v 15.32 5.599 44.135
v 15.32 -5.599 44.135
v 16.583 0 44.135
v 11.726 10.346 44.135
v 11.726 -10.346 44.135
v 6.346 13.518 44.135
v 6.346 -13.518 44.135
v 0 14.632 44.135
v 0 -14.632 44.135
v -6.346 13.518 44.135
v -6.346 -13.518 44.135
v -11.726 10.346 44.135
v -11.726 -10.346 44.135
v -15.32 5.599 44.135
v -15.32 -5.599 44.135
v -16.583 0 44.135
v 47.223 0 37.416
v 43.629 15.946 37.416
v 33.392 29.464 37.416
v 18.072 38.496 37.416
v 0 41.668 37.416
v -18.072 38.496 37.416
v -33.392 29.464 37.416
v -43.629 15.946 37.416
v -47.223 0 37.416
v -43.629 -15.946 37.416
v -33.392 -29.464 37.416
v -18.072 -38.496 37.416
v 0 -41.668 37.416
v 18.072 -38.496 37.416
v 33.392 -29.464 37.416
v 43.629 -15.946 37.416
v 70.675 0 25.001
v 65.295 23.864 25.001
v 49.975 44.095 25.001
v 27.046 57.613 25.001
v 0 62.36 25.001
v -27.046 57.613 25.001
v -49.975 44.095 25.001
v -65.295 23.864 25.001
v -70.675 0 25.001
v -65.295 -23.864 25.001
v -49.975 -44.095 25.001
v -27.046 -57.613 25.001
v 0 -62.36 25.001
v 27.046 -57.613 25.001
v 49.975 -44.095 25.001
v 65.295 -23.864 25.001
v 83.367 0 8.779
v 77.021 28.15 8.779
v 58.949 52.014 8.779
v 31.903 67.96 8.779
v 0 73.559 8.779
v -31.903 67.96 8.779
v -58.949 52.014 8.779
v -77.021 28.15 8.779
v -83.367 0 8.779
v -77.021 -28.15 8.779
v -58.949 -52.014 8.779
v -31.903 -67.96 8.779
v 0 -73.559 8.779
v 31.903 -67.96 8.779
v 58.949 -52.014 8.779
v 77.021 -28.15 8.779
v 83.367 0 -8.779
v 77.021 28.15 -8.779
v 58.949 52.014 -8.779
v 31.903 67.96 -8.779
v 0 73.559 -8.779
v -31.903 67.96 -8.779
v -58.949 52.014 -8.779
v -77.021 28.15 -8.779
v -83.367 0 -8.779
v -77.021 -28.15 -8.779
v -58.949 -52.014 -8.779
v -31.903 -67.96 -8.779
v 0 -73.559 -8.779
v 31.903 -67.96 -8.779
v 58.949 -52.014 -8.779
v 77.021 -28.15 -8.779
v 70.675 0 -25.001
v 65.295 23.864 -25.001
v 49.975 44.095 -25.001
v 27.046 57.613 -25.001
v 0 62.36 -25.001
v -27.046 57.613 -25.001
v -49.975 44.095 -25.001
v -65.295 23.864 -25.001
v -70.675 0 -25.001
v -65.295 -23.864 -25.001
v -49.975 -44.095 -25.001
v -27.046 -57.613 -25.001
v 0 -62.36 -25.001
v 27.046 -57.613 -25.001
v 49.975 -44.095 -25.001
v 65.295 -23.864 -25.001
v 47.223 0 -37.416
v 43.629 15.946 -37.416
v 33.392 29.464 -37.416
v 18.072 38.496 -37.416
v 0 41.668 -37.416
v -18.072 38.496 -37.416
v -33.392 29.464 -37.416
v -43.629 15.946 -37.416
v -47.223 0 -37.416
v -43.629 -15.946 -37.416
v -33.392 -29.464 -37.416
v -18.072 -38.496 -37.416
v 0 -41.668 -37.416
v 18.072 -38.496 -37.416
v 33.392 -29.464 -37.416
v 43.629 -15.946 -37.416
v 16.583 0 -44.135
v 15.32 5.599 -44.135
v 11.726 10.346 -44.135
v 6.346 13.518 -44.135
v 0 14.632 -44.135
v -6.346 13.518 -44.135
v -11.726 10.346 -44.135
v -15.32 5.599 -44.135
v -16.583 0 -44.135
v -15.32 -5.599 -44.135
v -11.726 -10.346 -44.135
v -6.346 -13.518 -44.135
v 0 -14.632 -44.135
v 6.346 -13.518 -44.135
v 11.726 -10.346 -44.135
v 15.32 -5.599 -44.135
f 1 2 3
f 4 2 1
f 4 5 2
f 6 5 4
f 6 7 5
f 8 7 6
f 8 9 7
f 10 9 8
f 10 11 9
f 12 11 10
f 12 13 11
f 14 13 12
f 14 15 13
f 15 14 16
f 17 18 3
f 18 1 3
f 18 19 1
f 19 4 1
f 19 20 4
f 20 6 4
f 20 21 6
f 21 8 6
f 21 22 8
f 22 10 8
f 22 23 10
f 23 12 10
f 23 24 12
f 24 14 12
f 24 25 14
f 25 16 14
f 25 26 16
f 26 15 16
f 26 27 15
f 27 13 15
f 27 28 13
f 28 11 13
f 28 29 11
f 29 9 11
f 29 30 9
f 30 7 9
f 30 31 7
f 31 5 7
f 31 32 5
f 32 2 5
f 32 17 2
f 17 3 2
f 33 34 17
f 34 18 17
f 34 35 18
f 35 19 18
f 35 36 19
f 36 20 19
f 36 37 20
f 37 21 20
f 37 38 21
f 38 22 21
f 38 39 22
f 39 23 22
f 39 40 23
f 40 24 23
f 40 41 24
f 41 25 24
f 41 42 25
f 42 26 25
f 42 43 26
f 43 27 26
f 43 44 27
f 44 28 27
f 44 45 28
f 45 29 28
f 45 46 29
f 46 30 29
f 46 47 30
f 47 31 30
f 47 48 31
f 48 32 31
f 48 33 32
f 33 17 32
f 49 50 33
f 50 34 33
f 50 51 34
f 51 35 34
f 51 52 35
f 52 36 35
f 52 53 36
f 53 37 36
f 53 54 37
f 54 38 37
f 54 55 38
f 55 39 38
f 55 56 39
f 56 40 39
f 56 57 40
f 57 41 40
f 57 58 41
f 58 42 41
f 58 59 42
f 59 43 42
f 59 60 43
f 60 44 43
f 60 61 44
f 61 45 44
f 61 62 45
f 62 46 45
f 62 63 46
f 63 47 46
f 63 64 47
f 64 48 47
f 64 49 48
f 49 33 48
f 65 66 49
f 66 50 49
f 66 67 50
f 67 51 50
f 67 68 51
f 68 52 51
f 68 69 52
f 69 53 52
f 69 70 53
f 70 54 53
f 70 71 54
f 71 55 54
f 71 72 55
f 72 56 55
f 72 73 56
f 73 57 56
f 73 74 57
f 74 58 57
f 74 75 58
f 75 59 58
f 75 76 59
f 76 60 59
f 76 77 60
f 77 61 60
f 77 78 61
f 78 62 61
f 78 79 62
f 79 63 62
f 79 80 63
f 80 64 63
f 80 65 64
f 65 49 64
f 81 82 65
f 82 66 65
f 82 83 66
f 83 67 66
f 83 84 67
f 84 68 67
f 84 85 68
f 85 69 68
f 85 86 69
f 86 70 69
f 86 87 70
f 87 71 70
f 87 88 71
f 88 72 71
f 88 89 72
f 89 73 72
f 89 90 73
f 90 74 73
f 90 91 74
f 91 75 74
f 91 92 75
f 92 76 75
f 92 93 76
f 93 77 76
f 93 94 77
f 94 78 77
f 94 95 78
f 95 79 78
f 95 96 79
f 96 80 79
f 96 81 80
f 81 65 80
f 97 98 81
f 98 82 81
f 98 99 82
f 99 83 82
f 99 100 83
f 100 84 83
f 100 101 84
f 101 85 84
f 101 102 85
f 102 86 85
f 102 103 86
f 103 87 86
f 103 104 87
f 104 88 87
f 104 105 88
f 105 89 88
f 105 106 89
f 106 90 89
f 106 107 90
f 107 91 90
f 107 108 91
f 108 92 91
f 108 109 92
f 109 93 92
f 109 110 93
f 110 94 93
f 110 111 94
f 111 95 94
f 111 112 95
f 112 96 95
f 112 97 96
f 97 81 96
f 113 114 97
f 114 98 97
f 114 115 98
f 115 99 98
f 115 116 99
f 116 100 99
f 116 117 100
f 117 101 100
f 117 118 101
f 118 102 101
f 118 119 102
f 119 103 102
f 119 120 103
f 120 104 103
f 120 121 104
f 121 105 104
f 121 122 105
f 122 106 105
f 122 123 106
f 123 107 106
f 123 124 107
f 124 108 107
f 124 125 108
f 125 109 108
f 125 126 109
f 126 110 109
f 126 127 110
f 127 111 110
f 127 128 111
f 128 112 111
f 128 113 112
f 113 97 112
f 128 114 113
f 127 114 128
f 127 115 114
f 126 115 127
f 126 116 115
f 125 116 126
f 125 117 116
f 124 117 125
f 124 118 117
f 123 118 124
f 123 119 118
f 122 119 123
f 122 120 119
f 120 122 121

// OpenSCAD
// Generated by SolidPython 1.0.1 on 2020-07-29 00:46:53


scale(v = [17, 15, 9]) {
	sphere(r = 5);
}
/***********************************************
*********      SolidPython code:      **********
************************************************
 
# import packages: SolidPython
from solid import *
from solid.utils import *
from itertools import chain, combinations, permutations


class Resize:

    def __init__(self, scad_file):
        self.scad_file = scad_file
        #self.scad_file = import_scad(scad_file)
        # cone/cylinder param:
        self.r1 = 0
        self.r2 = 0
        self.h = 0
        # rectangular prism param:
        self.w = 0
        self.l = 0
        # ellipse param:
        self.r = 0

    # import OpenScad code (file name corresponds to shape)


    # classify shape + parameters
    def assign(self, param1, param2, param3):
        if self.scad_file == 'cone.scad':
            self.r1 = param1
            self.r2 = param2
            self.h = param3
        elif self.scad_file == 'cylinder.scad':
            self.r1 = param1
            self.r2 = param2
            self.h = param3
        elif self.scad_file == 'rectangularPrism.scad':
            self.h = param1
            self.l = param2
            self.w = param3
        else:
            self.r = param1
            self.h = param2

    # resize parameters
    def iterate(self):
        x = range(3, 20, 2)
        i = 1
        if self.scad_file == 'cone.scad':
            tempList = list(permutations(x, 2))
            for temp in tempList:
                param1 = temp[0]
                param2 = temp[1]
                filepath = 'produced_scad_files/' + 'cone' + str(param1) + '_' + str(param2) + '_' + '.scad'
                scad_render_to_file(cylinder(h=param1, r1=param2, r2=0), filepath)

        elif self.scad_file == 'cylinder.scad':
            tempList = list(permutations(x, 3))
            for temp in tempList:
                param1 = temp[0]
                param2 = temp[1]
                filepath = 'produced_scad_files/' + 'cylinder' + str(param1) + '_' + str(param2) + '_' + '.scad'
                scad_render_to_file(cylinder(h=param1, r1=param2, r2=param2), filepath)

        elif self.scad_file == 'rectangularPrism.scad':
            tempList = list(permutations(x, 3))
            for temp in tempList:
                param1 = temp[0]
                param2 = temp[1]
                param3 = temp[2]
                filepath = 'produced_scad_files/' + 'rectangularPrism' + str(param1) + '_' + str(param2) + '_' + str(
                    param3) + '.scad'
                scad_render_to_file(cube(size=(param1, param2, param3)), filepath)

        elif self.scad_file == 'ellipse.scad':
            tempList = list(permutations(x, 4))
            for temp in tempList:
                param1 = temp[0]
                param2 = temp[1]
                param3 = temp[2]
                param4 = temp[3]
                filepath = 'produced_scad_files/' + 'ellipse' + str(param1) + '_' + str(param2) + '_' + str(param3) + '_' + str(param4) + '.scad'
                scad_render_to_file(scale([param1, param2, param3])(sphere(r=param4)), filepath)

    def render_to_scadfile(self):
        scad_render_to_file(scad, 'example.scad') 
 
************************************************/
